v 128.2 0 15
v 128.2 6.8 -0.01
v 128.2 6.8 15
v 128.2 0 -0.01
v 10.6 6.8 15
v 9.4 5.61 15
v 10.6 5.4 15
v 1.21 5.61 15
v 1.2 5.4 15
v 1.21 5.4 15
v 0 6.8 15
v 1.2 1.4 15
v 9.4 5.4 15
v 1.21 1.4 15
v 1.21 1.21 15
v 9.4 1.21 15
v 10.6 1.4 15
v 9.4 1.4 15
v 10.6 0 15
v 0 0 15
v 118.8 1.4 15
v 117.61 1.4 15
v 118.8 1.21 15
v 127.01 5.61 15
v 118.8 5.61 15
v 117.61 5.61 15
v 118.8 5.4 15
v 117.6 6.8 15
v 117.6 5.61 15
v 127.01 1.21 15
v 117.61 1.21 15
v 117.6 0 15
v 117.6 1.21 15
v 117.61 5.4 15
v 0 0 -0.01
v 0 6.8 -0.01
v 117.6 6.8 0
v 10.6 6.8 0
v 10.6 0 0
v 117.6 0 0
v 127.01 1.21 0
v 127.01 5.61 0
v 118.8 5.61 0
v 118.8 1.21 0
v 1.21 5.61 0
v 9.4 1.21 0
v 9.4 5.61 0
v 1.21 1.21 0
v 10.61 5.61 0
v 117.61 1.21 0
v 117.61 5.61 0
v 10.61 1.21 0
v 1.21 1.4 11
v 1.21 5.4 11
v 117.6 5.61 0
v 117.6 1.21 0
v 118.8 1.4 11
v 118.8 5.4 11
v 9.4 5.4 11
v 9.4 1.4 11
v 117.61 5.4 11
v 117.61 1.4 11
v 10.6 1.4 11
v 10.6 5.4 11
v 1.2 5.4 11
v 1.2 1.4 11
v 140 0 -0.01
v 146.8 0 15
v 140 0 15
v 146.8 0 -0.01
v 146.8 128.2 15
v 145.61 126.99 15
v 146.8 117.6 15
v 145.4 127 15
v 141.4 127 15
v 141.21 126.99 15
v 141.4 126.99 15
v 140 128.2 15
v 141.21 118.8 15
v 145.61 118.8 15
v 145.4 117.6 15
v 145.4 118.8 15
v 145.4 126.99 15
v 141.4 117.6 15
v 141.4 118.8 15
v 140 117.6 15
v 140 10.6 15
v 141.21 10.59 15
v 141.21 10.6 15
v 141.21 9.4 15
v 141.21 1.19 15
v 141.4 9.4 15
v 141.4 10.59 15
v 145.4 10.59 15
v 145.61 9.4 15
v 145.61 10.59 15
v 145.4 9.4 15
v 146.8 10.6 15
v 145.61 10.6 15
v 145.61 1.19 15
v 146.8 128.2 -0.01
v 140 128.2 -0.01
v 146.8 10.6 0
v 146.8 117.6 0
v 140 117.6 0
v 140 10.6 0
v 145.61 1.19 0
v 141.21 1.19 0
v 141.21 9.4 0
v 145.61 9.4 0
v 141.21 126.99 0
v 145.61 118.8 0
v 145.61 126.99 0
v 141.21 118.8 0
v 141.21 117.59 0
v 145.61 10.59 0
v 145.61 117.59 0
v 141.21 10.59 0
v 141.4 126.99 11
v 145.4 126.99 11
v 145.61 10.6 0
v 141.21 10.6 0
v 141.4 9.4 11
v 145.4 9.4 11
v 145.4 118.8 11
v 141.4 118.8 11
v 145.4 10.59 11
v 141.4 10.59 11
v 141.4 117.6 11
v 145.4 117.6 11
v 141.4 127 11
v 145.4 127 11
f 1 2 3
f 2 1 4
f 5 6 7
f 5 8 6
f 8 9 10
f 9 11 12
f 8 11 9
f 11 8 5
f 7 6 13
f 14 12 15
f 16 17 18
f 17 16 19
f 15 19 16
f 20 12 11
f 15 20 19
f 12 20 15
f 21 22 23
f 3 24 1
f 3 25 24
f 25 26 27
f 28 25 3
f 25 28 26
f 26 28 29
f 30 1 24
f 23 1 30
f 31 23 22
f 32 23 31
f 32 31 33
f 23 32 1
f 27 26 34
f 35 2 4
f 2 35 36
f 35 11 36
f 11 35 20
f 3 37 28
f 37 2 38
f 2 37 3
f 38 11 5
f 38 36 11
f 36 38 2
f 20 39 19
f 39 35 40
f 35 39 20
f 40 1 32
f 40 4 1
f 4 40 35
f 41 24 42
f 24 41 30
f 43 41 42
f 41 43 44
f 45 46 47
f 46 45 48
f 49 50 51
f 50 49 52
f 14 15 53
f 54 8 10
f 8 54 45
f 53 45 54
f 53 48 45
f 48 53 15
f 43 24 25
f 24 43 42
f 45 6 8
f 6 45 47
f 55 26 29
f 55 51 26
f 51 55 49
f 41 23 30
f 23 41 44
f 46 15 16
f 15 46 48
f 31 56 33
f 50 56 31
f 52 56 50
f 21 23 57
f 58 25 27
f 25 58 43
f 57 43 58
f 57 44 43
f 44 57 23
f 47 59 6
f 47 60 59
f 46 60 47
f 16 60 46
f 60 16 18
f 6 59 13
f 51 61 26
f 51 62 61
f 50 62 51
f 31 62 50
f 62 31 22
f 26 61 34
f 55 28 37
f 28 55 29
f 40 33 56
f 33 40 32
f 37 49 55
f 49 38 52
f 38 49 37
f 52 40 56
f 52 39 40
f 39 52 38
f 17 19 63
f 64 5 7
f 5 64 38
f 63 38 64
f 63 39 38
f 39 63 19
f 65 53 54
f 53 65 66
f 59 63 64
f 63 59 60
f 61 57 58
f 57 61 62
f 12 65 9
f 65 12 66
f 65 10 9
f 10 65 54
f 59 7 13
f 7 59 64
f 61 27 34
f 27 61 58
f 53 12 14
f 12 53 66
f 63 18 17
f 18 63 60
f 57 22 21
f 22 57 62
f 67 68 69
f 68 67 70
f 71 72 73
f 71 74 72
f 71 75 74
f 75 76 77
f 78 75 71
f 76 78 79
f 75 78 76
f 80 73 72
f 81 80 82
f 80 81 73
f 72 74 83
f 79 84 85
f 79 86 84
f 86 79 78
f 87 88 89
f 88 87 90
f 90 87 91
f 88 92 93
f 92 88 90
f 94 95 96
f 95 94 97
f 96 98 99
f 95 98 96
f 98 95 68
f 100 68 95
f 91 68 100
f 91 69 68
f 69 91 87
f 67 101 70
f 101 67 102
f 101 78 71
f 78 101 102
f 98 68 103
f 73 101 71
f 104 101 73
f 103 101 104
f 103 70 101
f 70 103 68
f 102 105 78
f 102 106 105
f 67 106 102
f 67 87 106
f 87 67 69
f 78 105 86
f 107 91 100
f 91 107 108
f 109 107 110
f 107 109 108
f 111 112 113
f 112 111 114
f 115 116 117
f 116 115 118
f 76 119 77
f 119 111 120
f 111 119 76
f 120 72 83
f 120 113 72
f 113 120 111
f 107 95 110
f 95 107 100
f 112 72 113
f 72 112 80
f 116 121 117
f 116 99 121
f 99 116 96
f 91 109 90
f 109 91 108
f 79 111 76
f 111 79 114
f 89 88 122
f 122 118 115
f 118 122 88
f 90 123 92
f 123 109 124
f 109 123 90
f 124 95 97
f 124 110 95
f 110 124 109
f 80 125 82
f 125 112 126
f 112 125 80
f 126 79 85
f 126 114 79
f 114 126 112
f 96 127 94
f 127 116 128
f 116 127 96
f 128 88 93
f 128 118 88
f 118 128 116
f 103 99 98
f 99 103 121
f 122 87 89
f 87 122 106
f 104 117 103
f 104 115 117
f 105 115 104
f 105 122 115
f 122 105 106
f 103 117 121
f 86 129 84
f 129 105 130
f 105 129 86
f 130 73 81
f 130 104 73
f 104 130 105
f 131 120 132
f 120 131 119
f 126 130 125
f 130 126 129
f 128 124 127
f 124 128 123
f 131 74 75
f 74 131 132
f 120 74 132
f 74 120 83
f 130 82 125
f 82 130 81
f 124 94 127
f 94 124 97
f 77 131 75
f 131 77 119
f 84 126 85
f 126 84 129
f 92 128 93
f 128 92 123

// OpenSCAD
// file: ../../Base/Boxes.scad
// Fischertechnik Box Foundation
// Pre-designed Boxes

use <Constants.scad>

include <PlacementOptions.scad>

box190Width = 190;
box190Depth = 130;
box130Width = 130;
box130Depth = 95;

// Values are from an original ec3 box
topBottomDifference = 1.5;
outerHeight = 40;
baseThickness = 1.8;
innerHeight = outerHeight - baseThickness;
stackExcess = 5.7;
radius = 3.5;
wallThickness = 1.5;
tolerance = 0.2;

boxWallThickness = wallThickness;
boxBaseThickness = baseThickness;
boxWebWidth = 3.0;

// getBoxWallThickness()
// Gets the wall thickness of a Fischertechnik Box
function getBoxWallThickness() = boxWallThickness;

// getBoxUsageHeight(height = 38.2)
// Gets the usable height of a Fischertechnik box
// height = Outer height of the box from the bottom to the upper edge.
function getBoxUsageHeight(height = outerHeight) = height - baseThickness - stackExcess;

// getBoxInnerHeight()
// Gets the inner height of a Fischertechnik box, including the stack excess
function getBoxInnerHeight() = innerHeight;

// getBoxBaseThickness()
// Gets the thickness of the Fischertechnik box base.
function getBoxBaseThickness() = boxBaseThickness;

// getBoxWebWidth()
// Gets the width of a box web
function getBoxWebWidth() = boxWebWidth;

// getBox190Space()
// Gets the usable inner space of a Box 190 as an x/y-list
function getBox190Space() = [
    box190Width - 2*getBoxWallThickness() - topBottomDifference, 
    box190Depth - 2*getBoxWallThickness() - topBottomDifference ];

// RoundedCornerPlate(width, depth, height, radius)
// Creates a body plate with rounded corners for a box. Used
// also to create the complete box with the hull module.
// width = Width of the plate
// depth = depth of the plate 
// height = thickness of the plate
// radius = radius of the rounded corner
module RoundedCornerPlate(width, depth, height, radius) {
    translate([radius, radius])
    hull() {
        w = width-2*radius;
        d = depth-2*radius;
        cube([w, d, height]);
        cylinder(height, r=radius, $fn=getFragments());
        translate([w, 0])
            cylinder(height, r=radius, $fn=getFragments());
        translate([w, d])
            cylinder(height, r=radius, $fn=getFragments());
        translate([0, d])
            cylinder(height, r=radius, $fn=getFragments());
    }
}

// BoxBase(width, depth)
// Creates an empty stackable Fischertechnik compatible box
// width = Outer width of the box (190, 130, ...)
// depth = Outer depth of the box (130, 95, ...)

module BoxBase(width, depth, height=outerHeight) {    
    thinPlate = 0.01;

    innerHeight = height - baseThickness;    
    
    module Body(tolerance=tolerance) {
        hull() {
            // Bottom with tolerance to fit into the original boxes when stacked
            translate([-wallThickness+tolerance, -wallThickness+tolerance, -baseThickness])
                RoundedCornerPlate(width-topBottomDifference-2*tolerance, depth-topBottomDifference-2*tolerance, thinPlate, radius);
            
            // Top
            translate([-wallThickness-topBottomDifference/2, -wallThickness-topBottomDifference/2, innerHeight-thinPlate])
                RoundedCornerPlate(width, depth, thinPlate, radius);
         }
    }

    module Cutoff() {
        hull() {
            coWidth = width - 2*wallThickness;
            coDepth = depth - 2*wallThickness;
            
            // Bottom
            RoundedCornerPlate(coWidth-topBottomDifference, coDepth-topBottomDifference, thinPlate, radius);

            // Top
            translate([-topBottomDifference/2, -topBottomDifference/2, innerHeight+thinPlate]) 
                RoundedCornerPlate(coWidth, coDepth, thinPlate, radius);
        }
    }
    
    difference() {        
        Body();
        Cutoff();
        stackOffset = innerHeight - stackExcess;
        translate([0, 0, stackOffset + baseThickness])
            Body(tolerance=0);
    }
}

// Creates the Fischertechnik empty box 130x190 mm and places it at position 0,0
// 190x130 are the outer sizes, the inner space is slightly smaller. Use getBox190Space() to get the inner sizes.
// The box is positioned that the usable inner space is at the 0,0,0 position.

module Box190() {
    BoxBase(box190Width, box190Depth);
}

// Gets the usable inner space of a Box 130 as an x/y-list
function getBox130Space() = [
    box130Width - 2*getBoxWallThickness() - topBottomDifference, 
    box130Depth - 2*getBoxWallThickness() - topBottomDifference ];

// Creates the Fischertechnik empty box 95x130 mm and places it at position 0,0
// 190x130 are the outer sizes, the inner space is slightly smaller. Use getBox190Space() to get the inner sizes.
// The box is positioned that the usable inner space is at the 0,0,0 position.

module Box130() {
    BoxBase(box130Width, box130Depth);
}

// Creates a web at the specified box walls
// corner 0 = LowerLeft, 1 = UpperLeft, 2 = UpperRight, 3 = LowerRight
// side 0 = LeftOfCorner, 1 = RightOfCorner
// distance = Distance in mm from the corner
// boxSpace = inner width and depth of the box (default: Box 190)
// webWidth = length of the web (default is 3 mms)
// webThickness = thickness of the web (default is 1 mm)
// height = Height of the web (standard is getBoxUsageHeight())
// sink = How much of the web is sunk into the wall

module BoxWeb(
    corner, 
    side, 
    distance, 
    boxSpace=getBox190Space(), 
    webWidth=getBoxWebWidth(), 
    webThickness=1.0, 
    height=getBoxUsageHeight(),
    sink = getBoxWallThickness()/2) {
    width = (corner % 2 == 0) ? 
            (side == LeftOfCorner ? webWidth : webThickness) :
            (side == LeftOfCorner ? webThickness : webWidth);

    depth = (corner % 2 == 0) ? 
            (side == RightOfCorner ? webWidth : webThickness) :
            (side == RightOfCorner ? webThickness : webWidth);
    
    xDiff = corner == LowerLeft ? 
                (side == LeftOfCorner ? -sink : distance) :
            (corner == UpperLeft ?                
                (side == LeftOfCorner ? distance : -sink) :
            (corner == UpperRight ?
                (side == LeftOfCorner ? boxSpace.x-webWidth+sink : boxSpace.x-distance-webThickness) :
                (side == LeftOfCorner ? boxSpace.x-distance-webThickness: boxSpace.x-webWidth+sink)));

    yDiff = corner == LowerLeft ? 
                (side == RightOfCorner ? -sink : distance) :
            (corner == UpperLeft ?
                (side == RightOfCorner ? boxSpace.y-distance-webThickness : boxSpace.y-webWidth+sink) :
            (corner == UpperRight ?
                (side == RightOfCorner ? boxSpace.y-webWidth+sink : boxSpace.y-distance-webThickness) :
                (side == RightOfCorner ? distance : -sink)));
    
    translate([xDiff, yDiff, -getExcess()])
        cube([width, depth, height + 2*getExcess()]);
}
// file: ../../Base/Rotation.scad
// Fischertechnik Box Foundation
// Geometry Helpers Rotation

include <PlacementOptions.scad>

// getRotatedSpace(space, rotation=NoRotation)
// Rotates the space dependent on the specified rotation

function getRotatedSpace(space, rotation=NoRotation) = [
    (rotation == Rotate90 || rotation == Rotate270) ? space.y : space.x,
    (rotation == Rotate90 || rotation == Rotate270) ? space.x : space.y
];

// Rotates the given space around the fixed left lower corner
// space = the space the children needs as width/depth list [width,depth]
// rotation = 0 Rotate0 degrees, 1 Rotate90 degrees, 2 Rotate180 degrees, 3 Rotate270 degrees (equivalent to -90)

module RotateFix(space, rotation=NoRotation) {
    dy = (rotation == Rotate0 || rotation == Rotate270) ? 0 :
        (rotation == Rotate90) ? space.x :
        space.y;
    dx = (rotation < Rotate180) ? 0 :
        (rotation == Rotate180) ? space.x :
        space.y;
    
    translate([dx, dy, 0])
        rotate([0, 0, rotations[rotation]])
            children();
}
// file: ../../Base/Alignment.scad
// Fischertechnik Box Foundation
// Geometry Helpers Alignment

include <PlacementOptions.scad>

// getAlignedX(elementWidth, spaceWidth, align=AlignRight, offset=0)
// Gets the aligned X offset of an element with the given
// width in the given space.
// elementWidth = The width of the element to positon
// spaceWidth = The space where the element should be aligned
// align = 0 AlignLeft, 1 AlignCenter, 2 AlignRight
// offset = an optional offset from the aligned position. When
// aligned left or centered, then positive values are in X direction.
// When aligned right then positive values are in negative X direction.

function getAlignedX(elementWidth, spaceWidth, align=AlignRight, offset=0) =
    (align == AlignLeft) ?
        offset :
        ((align == AlignCenter) ?
        (spaceWidth - elementWidth)/2 + offset :
        spaceWidth - offset - elementWidth);

// getAlignedY(elementDepth, spaceDepth, align=AlignTop, offset=0)
// Gets the aligned Y offset of an element with the given
// depth in the given space.
// elementDepth = The depth of the element to positon
// spaceDepth = The space where the element should be aligned
// align = 0 AlignBottom, 1 AlignCenter, 2 AlignTop
// offset = an optional offset from the aligned position. When
// aligned bottom or centered, then positive values are in Y direction.
// When aligned top then positive values are in negative Y direction.

function getAlignedY(elementDepth, spaceDepth, align=AlignTop, offset=0) =
    (align == AlignBottom) ?
        offset :
        ((align == AlignCenter) ?
        (spaceDepth - elementDepth)/2 + offset :
        spaceDepth - offset - elementDepth);
// file: ../../Base/Constants.scad
// Fischertechnik Box Foundation
// Constants

// Constant values necessary for multiple elements

// Base constants
dividerThickness = 1.2;
excess = 0.01;
fragments = 90;
tolerance = 0.8;

// Gets the thickness of a divider 
function getDividerThickness() = dividerThickness;

// Gets the excess that is used to merge walls into each other
function getExcess() = excess;

// Gets amount of fragments of a cylinder
function getFragments() = fragments;

// Gets the inner tolerance of a frame to each side
function getTolerance() = tolerance;


// Fischertechnik specific constants
axisDiameter = 4;
axisBottomDiameter = axisDiameter + 1;
axisTolerance = 0.2;
axisLockingLength = 8;

// Gets axis diameter of Fischertechnik axis
function getAxisDiameter() = axisDiameter;

// Gets axis diameter tolerance (subtracted for element axis)
function getAxisTolerance() = axisTolerance;

// Gets the axis diameter for standing axis
function getStandAxisDiameter() = getAxisDiameter() - getAxisTolerance();

// Gets axis bottom diameter for thicker part at the bottom
function getAxisBottomDiameter() = axisBottomDiameter;

// Gets the lengthh of the locking part of a locking axis
function getAxisLockingLength() = axisLockingLength;

// Studs

studHeight = 2.5;
studTolerance = 0.2;
studRailDistance = 9;   // as in ft 50

// gets the height of a connecting stud
function getStudHeight() = studHeight;

// gets the connecting stud height tolerance
function getStudTolerance() = studTolerance;

// gets the default rail distance for studs
function getStudRailDistance() = studRailDistance;

// Dockable Frame with Edge

standardEdgeDistance = 2.5;
standardWebDistance = 11.5;
standardCornerLength = 15;

// gets the standard distance to the wall of the box for dockable frames with webs
function getStandardEdgeDistance() = standardEdgeDistance;

// gets the standard distance of each web to the corner of the dockable frame
function getStandardWebDistance() = standardWebDistance;

// gets the standard length of the corner walls of a dockable frame
function getStandardCornerLength() = standardCornerLength;

// Tubes

tubeWallFactor = 0.8;

// gets the wall thickness of a tube.
function getTubeWallThickness() = tubeWallFactor * getDividerThickness();

// Small Parts and Divider Frame

smallPartsFrameHeight = 20;

// gets the frame height for docked small parts boxes.
function getSmallPartsFrameHeight() = smallPartsFrameHeight;

// Hubs

hubRingDiameter = 19.5;
hubRingLevelDiameter = 21;

// gets the diameter of a tube matching the inner ring of a wheel
function getHubRingDiameter() = hubRingDiameter;

// gets the diameter of a hub tube with a thicker diameter
function getHubRingLevelDiameter() = hubRingLevelDiameter;

// Struts

strutAddLength = 9.0;
strutDepth = 8.0;

// gets the full length of a strut
function getFullStrutLength(length) = length + strutAddLength;

// gets the radius of the end of a strut
function getStrutEndRadius() = strutAddLength / 2;

// gets the the depth of a strut
function getStrutDepth() = strutDepth;

// Propeller

propellerAxisDiameter = 7.0;
propellerAxisTolerance = 0.2;

// gets the propeller axis outer diameter
function getPropellerAxisDiameter() = propellerAxisDiameter;

// gets the propeller axis printing tolerance
function getPropellerAxisTolerance() = propellerAxisTolerance;
// file: ../../Base/PlacementOptions.scad
// Fischertechnik Box Foundation
// Placement Options

// Alignment
NoAlign = 0;
AlignLeft = 1;
AlignBottom = 2;
AlignCenter = 3;
AlignRight = 4;
AlignTop = 5;

// Element rotation degree steps
rotations = [0, -90, -180, -270];

// Rotation
NoRotation = 0;
Rotate0 = 0;
Rotate90 = 1;
Rotate180 = 2;
Rotate270 = 3;

// Docking (seen from above)
NoDock = -1;
DockLeft = 0;
DockTop = 1;
DockRight = 2;
DockCorner = 2;
DockBottom = 3;

// Web corners
LowerLeft = 0;
UpperLeft = 1;
UpperRight = 2;
LowerRight = 3;

// Web position relative to corner
LeftOfCorner = 0;
RightOfCorner = 1;

// Rails direction
Horizontal = true;
Vertical = false;
// file: ../../Elements/FrameAxis125.scad
// Fischertechnik Box Library
// Frame for single 125 mm Axis
// 31036

use <../ModelBase/Complex.scad>

/* [Element Parameters] */
count = 1;

/* [Hidden] */
length = 125;

// getFrameAxis125Space(count=1)
// Gets the width (.x) and depth (.y) of the axis frame.
// count = Count of axis

function getFrameAxis125Space(count=1) = getFrameAxisSpace(length, count);

// FrameAxis125(count=1)
// Axis holder for a single 125 mm axis.
// count = Count of axis

module FrameAxis125(count=1) {
    FrameAxis(length, count);
}

// Test
color("lightgray")
FrameAxis125(count);
// file: ../../Base/Placement.scad
// Fischertechnik Box Foundation
// Geometry Helpers Placement

use <Constants.scad>
use <Alignment.scad>
use <Rotation.scad>
use <Boxes.scad>

include <PlacementOptions.scad>

// Place(x=0, y=0, elementSpace=[0,0], alignX=AlignLeft, alignY=AlignBottom, rotation=Rotate0, boxSpace=getBox190Space())
// Places the child at the specified position
// y = Y-Position. This is a relative position when an X aligment is specified.
// x = X-Position. This is a relative position when an Y aligment is specified.
// elementSpace = space of the element to be placed [x,y]
// alignX = -1=NoAlign, 0 AlignLeft, 1 AlignCenter, 3 AlignRight (elementSpace and boxSpace required!)
// alignY = -1=NoAlign, 2 AlignBottom, 1 AlignCenter, 4 AlignTop (elementSpace and boxSpace required!)
// rotation = 0 Rotate0 0 degrees, 1 Rotate90 90 degrees, 
// 2 Rotate180 180 degrees, 3 Rotate270 270 degrees (equivalent to -90)
// boxSpace = Inner space of the box where the placement occurs [x,y] - default is Box 190x130 inner space

module Place(x=0, y=0, elementSpace=[0,0], 
  alignX=AlignLeft, alignY=AlignBottom, 
  rotation=NoRotation, boxSpace=getBox190Space()) {

    module Position(x, y, space, rotation=Rotate0) {
        translate([x, y, 0])
            RotateFix(space, rotation)
                children();
    }

    space = getRotatedSpace(elementSpace, rotation);
    alignedX = getAlignedX(space.x, boxSpace.x, alignX, x);
    alignedY = getAlignedY(space.y, boxSpace.y, alignY, y);
    Position(alignedX, alignedY, elementSpace, rotation)
        children();
}

// Center(space=getBox130Space(), elementSpace=[0,0])
// space = Space where the children is centered. For cylinder use centered=true and no elementSpace.
// elementSpace = space of the element to be centered [x,y]

module Center(space=getBox190Space(), elementSpace=[0,0]) {
    Place(elementSpace=elementSpace, boxSpace=space, alignX=AlignCenter, alignY=AlignCenter)
        children();
}

// CenterHorizontal(width=0, y=0, offset=0, space=getBox130Space())
// width = Width of the element to be placed.
// y = Y position of the element
// offset = Offset from the center position (negative will be left of the center)
// space = Space where the element is placed

module CenterHorizontal(width=0, y=0, offset=0, space=getBox190Space()) {
    Place(x=offset, y=y, elementSpace=[width, 0], boxSpace=space, alignX=AlignCenter)
        children(0);
}

// CenterVertical(depth=0, x=0, offset=0, space=getBox130Space())
// depth = Depth of the element to be placed.
// x = X position of the element
// offset = Offset from the center position (negative will be down of the center)
// space = Space where the element is placed

module CenterVertical(depth=0, x=0, offset=0, space=getBox190Space()) {
    Place(x=x, y=offset, elementSpace=[0, depth], boxSpace=space, alignY=AlignCenter)
        children(0);
}

// getIsVertical(align)
// True if the specified alignment needs a vertical orientation for a divider (AlignRight, AlignLeft)

function getIsVertical(align) = (align == AlignRight || align == AlignLeft);

// getIsHorizontal(align)
// True if the specified alignment needs a horizontal orientation for a divider (AlignTop, AlignBottom)

function getIsHorizontal(align) = (align == AlignTop || align == AlignBottom);
// main file
// Fischertechnik Box Foundation
// Elements
// Test FrameAxis125

use <../../Base/Placement.scad>
use <../../Elements/FrameAxis125.scad>

include <../../Base/PlacementOptions.scad>

count = 1;

FrameAxis125(count);

Place(140, 0, elementSpace=getFrameAxis125Space(count), rotation=Rotate90)
    FrameAxis125(count);
